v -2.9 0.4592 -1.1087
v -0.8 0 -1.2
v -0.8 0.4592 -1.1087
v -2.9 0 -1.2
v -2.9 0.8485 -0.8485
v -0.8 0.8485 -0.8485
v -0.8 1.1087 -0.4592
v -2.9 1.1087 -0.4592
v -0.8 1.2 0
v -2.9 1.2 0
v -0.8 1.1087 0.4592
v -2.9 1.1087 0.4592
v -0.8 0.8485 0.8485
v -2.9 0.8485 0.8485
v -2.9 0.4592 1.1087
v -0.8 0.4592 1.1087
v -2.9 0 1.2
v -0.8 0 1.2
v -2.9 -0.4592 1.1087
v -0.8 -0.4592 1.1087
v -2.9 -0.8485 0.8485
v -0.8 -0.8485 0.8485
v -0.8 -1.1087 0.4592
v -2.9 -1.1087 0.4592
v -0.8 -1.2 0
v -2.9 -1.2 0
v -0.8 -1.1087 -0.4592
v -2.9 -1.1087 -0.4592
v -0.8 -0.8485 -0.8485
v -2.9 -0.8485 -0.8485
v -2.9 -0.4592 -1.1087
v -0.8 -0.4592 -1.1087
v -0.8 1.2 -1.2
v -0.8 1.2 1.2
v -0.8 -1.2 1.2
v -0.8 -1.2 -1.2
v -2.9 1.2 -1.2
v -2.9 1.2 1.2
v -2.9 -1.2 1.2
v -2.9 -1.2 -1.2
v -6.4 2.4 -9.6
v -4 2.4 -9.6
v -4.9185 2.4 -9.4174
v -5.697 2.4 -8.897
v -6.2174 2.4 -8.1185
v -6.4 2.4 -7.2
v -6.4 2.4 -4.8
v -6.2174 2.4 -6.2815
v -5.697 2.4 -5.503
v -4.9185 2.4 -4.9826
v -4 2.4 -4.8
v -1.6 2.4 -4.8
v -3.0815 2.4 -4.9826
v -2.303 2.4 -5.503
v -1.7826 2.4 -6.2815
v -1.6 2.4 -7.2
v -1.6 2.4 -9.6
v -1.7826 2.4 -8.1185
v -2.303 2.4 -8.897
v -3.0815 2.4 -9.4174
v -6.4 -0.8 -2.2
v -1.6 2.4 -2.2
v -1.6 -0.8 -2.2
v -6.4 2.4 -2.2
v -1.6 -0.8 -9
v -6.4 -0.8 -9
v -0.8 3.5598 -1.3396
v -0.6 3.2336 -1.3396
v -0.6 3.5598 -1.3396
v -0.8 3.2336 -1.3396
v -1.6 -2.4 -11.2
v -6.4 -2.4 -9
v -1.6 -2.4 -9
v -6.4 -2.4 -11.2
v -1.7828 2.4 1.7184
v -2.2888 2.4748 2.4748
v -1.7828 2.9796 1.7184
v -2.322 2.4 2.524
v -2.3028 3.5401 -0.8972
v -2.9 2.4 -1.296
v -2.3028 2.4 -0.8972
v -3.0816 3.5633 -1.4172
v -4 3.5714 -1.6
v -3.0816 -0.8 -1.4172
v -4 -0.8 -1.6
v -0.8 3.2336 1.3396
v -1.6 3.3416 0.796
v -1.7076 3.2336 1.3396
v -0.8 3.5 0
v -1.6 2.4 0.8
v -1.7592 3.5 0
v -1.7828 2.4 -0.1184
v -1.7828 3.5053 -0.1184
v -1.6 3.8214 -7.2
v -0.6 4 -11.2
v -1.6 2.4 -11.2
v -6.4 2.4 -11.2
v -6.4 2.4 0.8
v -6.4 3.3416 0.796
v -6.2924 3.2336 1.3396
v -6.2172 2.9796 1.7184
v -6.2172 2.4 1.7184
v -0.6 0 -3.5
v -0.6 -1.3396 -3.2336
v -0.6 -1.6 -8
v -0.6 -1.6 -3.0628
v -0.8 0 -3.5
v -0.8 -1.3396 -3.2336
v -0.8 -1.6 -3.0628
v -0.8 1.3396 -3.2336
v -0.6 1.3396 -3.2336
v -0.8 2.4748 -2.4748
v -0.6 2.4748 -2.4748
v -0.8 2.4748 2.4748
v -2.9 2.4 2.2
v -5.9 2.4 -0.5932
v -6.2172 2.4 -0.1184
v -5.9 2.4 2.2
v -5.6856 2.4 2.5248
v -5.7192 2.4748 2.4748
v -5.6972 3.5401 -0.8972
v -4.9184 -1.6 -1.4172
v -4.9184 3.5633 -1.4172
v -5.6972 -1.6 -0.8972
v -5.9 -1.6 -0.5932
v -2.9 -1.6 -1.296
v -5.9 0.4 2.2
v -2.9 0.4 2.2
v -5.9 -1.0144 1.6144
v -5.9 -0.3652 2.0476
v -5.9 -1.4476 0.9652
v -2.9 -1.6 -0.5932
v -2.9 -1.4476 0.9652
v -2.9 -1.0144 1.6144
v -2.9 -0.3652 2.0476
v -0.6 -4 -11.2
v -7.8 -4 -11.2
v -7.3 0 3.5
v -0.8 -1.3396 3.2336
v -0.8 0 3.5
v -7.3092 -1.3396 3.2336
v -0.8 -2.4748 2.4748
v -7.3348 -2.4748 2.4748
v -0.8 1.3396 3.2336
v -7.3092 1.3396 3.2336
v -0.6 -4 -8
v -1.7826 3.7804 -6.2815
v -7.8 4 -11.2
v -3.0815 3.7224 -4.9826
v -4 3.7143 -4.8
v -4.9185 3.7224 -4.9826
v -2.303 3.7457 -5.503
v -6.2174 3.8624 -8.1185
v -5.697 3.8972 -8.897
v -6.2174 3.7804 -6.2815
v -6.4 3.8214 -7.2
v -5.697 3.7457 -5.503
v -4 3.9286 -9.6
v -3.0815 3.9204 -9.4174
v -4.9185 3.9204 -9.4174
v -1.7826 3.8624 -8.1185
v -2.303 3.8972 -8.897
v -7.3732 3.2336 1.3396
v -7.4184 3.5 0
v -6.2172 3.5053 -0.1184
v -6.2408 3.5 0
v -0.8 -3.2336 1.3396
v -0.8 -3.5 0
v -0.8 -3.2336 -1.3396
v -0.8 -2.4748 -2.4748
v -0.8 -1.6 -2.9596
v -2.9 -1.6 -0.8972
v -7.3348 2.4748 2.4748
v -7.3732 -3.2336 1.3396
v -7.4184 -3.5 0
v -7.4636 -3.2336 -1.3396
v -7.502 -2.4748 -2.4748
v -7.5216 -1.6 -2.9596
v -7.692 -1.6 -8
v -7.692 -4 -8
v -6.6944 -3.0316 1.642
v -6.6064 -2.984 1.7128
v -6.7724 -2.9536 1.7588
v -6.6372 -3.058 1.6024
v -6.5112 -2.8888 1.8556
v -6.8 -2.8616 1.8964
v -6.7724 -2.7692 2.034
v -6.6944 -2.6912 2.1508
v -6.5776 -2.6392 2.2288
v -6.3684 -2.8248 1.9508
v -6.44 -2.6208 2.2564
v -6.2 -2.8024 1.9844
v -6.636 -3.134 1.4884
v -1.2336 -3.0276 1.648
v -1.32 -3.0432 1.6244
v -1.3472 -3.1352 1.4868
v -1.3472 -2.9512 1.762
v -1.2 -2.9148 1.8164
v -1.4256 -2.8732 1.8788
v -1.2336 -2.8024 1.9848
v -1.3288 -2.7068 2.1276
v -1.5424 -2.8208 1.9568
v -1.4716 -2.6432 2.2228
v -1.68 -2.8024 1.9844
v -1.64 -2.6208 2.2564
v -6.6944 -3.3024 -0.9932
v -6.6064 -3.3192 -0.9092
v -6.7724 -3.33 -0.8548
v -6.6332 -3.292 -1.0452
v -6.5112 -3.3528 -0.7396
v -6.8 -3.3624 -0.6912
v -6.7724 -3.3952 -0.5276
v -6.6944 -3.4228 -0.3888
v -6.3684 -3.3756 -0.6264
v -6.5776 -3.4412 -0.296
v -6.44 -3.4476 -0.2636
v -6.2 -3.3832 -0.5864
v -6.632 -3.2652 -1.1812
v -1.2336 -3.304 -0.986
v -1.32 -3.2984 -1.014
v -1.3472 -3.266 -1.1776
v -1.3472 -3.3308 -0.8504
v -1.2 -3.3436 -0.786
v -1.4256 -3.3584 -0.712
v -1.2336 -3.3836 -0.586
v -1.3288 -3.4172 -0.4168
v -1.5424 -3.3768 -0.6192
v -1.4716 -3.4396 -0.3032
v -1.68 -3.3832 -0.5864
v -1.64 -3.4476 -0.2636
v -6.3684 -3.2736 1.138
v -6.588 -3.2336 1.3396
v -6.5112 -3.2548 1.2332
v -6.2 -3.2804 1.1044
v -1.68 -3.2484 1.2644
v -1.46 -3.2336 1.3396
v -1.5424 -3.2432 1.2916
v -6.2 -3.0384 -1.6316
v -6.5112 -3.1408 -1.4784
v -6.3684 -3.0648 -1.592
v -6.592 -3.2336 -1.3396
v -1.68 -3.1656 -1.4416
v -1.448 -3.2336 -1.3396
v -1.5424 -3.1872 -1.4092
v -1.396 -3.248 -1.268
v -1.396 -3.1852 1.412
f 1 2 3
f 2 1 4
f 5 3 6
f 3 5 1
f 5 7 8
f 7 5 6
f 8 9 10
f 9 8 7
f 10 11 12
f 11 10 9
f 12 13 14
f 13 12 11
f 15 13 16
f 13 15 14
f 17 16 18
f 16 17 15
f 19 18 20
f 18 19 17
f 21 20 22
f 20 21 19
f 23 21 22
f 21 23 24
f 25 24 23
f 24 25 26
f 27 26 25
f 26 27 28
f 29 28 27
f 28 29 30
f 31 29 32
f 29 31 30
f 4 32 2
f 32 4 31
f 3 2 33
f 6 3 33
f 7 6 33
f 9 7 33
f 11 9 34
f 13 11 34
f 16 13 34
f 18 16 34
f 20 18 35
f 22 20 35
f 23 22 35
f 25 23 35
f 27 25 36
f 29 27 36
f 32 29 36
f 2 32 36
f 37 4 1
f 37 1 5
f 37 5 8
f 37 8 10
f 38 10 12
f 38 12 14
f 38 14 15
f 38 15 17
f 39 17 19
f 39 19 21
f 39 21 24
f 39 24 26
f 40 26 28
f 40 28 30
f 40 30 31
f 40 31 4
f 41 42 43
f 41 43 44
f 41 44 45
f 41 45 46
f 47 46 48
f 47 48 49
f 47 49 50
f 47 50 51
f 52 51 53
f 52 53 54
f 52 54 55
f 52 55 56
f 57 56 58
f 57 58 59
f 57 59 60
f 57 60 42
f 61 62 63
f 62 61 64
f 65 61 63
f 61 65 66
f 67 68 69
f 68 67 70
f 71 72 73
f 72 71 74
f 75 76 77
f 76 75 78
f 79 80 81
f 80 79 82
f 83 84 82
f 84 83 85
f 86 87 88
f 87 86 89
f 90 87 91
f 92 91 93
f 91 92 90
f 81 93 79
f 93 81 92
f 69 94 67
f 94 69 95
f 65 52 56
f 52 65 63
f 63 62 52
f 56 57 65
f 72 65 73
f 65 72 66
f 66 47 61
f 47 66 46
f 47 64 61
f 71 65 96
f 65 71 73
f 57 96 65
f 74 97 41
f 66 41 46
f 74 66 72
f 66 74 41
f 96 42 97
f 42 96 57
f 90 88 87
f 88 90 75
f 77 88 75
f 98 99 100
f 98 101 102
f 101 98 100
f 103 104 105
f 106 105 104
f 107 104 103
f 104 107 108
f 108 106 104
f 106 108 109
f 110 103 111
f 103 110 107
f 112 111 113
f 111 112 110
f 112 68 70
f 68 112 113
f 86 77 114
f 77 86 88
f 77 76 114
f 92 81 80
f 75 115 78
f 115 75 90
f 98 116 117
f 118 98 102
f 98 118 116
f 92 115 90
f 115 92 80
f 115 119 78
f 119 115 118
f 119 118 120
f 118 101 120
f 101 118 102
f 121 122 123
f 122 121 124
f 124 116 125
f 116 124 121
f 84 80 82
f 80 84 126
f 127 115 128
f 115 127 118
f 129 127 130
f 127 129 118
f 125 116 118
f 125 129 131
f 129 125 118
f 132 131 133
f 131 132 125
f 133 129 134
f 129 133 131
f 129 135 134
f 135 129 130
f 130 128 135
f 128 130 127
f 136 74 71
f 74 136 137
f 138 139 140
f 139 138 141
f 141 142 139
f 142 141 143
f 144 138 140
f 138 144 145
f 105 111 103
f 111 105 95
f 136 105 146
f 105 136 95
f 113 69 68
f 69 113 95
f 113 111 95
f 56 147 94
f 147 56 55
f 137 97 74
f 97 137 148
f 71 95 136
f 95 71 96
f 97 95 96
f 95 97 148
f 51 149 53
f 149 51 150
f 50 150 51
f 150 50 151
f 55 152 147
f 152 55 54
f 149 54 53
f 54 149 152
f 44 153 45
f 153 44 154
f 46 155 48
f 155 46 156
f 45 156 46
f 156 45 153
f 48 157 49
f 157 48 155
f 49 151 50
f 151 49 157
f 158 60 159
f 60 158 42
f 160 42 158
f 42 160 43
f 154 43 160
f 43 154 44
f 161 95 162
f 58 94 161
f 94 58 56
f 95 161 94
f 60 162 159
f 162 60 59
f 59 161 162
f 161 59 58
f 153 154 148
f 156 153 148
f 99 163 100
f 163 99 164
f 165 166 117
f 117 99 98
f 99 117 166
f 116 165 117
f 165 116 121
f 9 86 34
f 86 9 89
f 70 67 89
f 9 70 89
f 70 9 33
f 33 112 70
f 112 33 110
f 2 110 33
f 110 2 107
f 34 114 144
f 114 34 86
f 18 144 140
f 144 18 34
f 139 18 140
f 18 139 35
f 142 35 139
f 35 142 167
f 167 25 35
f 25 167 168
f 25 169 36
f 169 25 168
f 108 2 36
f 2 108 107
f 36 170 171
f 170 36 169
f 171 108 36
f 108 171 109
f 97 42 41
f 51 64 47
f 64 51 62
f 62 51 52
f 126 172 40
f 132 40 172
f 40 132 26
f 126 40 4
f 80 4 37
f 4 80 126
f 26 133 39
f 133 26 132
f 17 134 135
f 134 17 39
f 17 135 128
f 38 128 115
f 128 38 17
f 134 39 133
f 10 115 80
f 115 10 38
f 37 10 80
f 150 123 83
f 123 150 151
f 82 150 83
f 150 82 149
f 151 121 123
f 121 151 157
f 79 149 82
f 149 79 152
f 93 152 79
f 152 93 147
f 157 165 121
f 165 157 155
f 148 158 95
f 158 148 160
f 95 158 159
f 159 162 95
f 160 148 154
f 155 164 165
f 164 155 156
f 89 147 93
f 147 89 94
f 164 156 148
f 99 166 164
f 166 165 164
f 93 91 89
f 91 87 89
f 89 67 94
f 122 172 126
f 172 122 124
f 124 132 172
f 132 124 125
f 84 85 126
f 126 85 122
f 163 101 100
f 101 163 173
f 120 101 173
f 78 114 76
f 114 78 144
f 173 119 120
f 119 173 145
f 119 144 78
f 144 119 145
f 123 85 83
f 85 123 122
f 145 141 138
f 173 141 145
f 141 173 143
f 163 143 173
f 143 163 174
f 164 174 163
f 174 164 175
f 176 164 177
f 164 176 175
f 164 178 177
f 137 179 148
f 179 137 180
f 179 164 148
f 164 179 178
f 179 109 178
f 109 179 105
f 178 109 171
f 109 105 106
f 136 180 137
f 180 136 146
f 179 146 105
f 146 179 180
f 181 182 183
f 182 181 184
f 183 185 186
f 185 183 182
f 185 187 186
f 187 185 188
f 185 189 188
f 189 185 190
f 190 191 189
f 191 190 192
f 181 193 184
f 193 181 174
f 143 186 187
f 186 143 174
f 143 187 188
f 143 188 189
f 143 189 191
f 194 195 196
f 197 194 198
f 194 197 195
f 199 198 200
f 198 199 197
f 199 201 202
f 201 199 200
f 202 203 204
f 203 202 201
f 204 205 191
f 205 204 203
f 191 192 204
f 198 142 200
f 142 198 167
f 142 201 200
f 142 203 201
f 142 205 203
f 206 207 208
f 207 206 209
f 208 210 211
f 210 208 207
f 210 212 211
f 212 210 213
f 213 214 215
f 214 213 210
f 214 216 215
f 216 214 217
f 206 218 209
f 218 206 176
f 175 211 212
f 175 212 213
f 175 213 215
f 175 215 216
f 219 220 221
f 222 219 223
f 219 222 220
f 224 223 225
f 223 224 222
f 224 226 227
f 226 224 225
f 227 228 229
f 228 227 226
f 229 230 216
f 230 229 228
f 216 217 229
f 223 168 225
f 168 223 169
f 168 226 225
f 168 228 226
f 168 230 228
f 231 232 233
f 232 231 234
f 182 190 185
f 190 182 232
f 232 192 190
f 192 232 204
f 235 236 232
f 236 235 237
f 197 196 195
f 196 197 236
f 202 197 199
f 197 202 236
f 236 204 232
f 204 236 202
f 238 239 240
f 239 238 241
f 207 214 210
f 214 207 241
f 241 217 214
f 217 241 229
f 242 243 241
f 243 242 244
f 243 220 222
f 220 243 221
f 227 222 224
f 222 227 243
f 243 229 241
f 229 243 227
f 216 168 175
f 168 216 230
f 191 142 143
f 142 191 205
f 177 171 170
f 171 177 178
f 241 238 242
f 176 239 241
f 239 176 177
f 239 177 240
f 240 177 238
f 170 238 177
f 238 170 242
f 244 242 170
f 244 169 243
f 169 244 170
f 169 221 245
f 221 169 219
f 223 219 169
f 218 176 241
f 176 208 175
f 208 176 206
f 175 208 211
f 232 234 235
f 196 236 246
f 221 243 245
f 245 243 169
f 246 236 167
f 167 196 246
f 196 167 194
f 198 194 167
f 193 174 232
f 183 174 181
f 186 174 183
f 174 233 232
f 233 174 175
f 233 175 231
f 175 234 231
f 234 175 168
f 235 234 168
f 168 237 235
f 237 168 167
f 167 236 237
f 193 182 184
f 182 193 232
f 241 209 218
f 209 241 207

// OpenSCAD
use <../lib.scad>
use <s/3817bs01.scad>
function ldraw_lib__3816bp6f() = [
// 0 ~Minifig Leg Right with Astro Pattern (Obsolete)
// 0 Name: 3816bp6f.dat
// 0 Author: Philippe Hurbain [Philo]
// 0 !LDRAW_ORG Part UPDATE 2023-03
// 0 !LICENSE Licensed under CC BY 4.0 : see CAreadme.txt
// 
// 0 BFC CERTIFY CCW
  [0,"BFC","CERTIFY"],
  [0,"BFC","CCW"],
// 
// 0 !CATEGORY Obsolete
// 0 !KEYWORDS Astrobots, Biff Starling, Bricklink 970c00pb0027
// 0 !KEYWORDS Mars Exploration Rover, promotional, Sandy Moondust, set 3928
// 0 !KEYWORDS set 3929
// 
// 0 !HISTORY 2020-06-02 [Philo] Adapted to corrected geometry
// 0 !HISTORY 2020-06-02 [pneaster] Original pattern design
// 0 !HISTORY 2020-12-29 [PTadmin] Official Update 2020-03
// 0 !HISTORY 2023-05-03 [Holly-Wood] Obsoleted due to bad geometry
// 0 !HISTORY 2023-06-24 [OrionP] Official Update 2023-03
// 
// 
// 1 16 0 0 0 -1 0 0 0 1 0 0 0 1 s\3817bs01.dat
  [1,16,0,0,0,-1,0,0,0,1,0,0,0,1, ldraw_lib__s__3817bs01()],
// 0 // Flat Front
// 4 16 -18.804 7.399 -4 -19.23 20 -4 -1.5 20 -4 -2 7.657 -4
  [4,16,-18.804,7.399,-4,-19.23,20,-4,-1.5,20,-4,-2,7.657,-4],
// 3 16 -18.804 7.399 -4 -2 7.657 -4 -2 7.399 -4
  [3,16,-18.804,7.399,-4,-2,7.657,-4,-2,7.399,-4],
// 3 16 -2 7.657 -4 -1.5 20 -4 -1.5 7.657 -4
  [3,16,-2,7.657,-4,-1.5,20,-4,-1.5,7.657,-4],
// 0 // Foot Front
// 4 16 -1.5 28 -10 -1.5 20 -10 -19.23 20 -10 -19.5 28 -10
  [4,16,-1.5,28,-10,-1.5,20,-10,-19.23,20,-10,-19.5,28,-10],
// 0 // Foot Top
// 4 16 -19.23 20 -4 -19.23 20 -10 -1.5 20 -10 -1.5 20 -4
  [4,16,-19.23,20,-4,-19.23,20,-10,-1.5,20,-10,-1.5,20,-4],
// 0 // condlines
// 5 24 -2 3.349 -8.084 -18.659 3.349 -8.084 -2 0 -8.75 -2 6.187 -6.187
  [5,24,-2,3.349,-8.084,-18.659,3.349,-8.084,-2,0,-8.75,-2,6.187,-6.187],
// 5 24 -2 6.187 -6.187 -18.755 6.187 -6.187 -2 7.399 -4 -2 3.349 -8.084
  [5,24,-2,6.187,-6.187,-18.755,6.187,-6.187,-2,7.399,-4,-2,3.349,-8.084],
// 5 24 -2 0 -8.75 -18.546 0 -8.75 -2 3.349 -8.084 -2 -3.349 -8.084
  [5,24,-2,0,-8.75,-18.546,0,-8.75,-2,3.349,-8.084,-2,-3.349,-8.084],
// 5 24 -2 -3.349 -8.084 -18.433 -3.349 -8.084 -2 0 -8.75 -2 -6.187 -6.187
  [5,24,-2,-3.349,-8.084,-18.433,-3.349,-8.084,-2,0,-8.75,-2,-6.187,-6.187],
// 0 // Pattern
// 4 0 -16.736 -4.105 -7.579 -16.593 -4.006 -7.645 -16.516 -4.282 -7.46 -16.931 -4.397 -7.384
  [4,0,-16.736,-4.105,-7.579,-16.593,-4.006,-7.645,-16.516,-4.282,-7.46,-16.931,-4.397,-7.384],
// 4 0 -16.931 -4.397 -7.384 -16.516 -4.282 -7.46 -16.278 -4.639 -7.222 -17 -4.741 -7.154
  [4,0,-16.931,-4.397,-7.384,-16.516,-4.282,-7.46,-16.278,-4.639,-7.222,-17,-4.741,-7.154],
// 4 0 -16.931 -5.085 -6.923 -17 -4.741 -7.154 -16.278 -4.639 -7.222 -16.736 -5.377 -6.728
  [4,0,-16.931,-5.085,-6.923,-17,-4.741,-7.154,-16.278,-4.639,-7.222,-16.736,-5.377,-6.728],
// 4 0 -16.736 -5.377 -6.728 -16.278 -4.639 -7.222 -15.921 -4.877 -7.062 -16.444 -5.572 -6.598
  [4,0,-16.736,-5.377,-6.728,-16.278,-4.639,-7.222,-15.921,-4.877,-7.062,-16.444,-5.572,-6.598],
// 4 0 -16.1 -5.641 -6.552 -16.444 -5.572 -6.598 -15.921 -4.877 -7.062 -15.5 -4.961 -7.006
  [4,0,-16.1,-5.641,-6.552,-16.444,-5.572,-6.598,-15.921,-4.877,-7.062,-15.5,-4.961,-7.006],
// 4 16 -16.59 -3.721 -7.835 -16.593 -4.006 -7.645 -16.736 -4.105 -7.579 -18.433 -3.349 -8.084
  [4,16,-16.59,-3.721,-7.835,-16.593,-4.006,-7.645,-16.736,-4.105,-7.579,-18.433,-3.349,-8.084],
// 4 16 -17 -4.741 -7.154 -16.931 -5.085 -6.923 -18.337 -6.187 -6.187 -18.433 -3.349 -8.084
  [4,16,-17,-4.741,-7.154,-16.931,-5.085,-6.923,-18.337,-6.187,-6.187,-18.433,-3.349,-8.084],
// 3 16 -18.337 -6.187 -6.187 -16.931 -5.085 -6.923 -16.736 -5.377 -6.728
  [3,16,-18.337,-6.187,-6.187,-16.931,-5.085,-6.923,-16.736,-5.377,-6.728],
// 3 16 -18.337 -6.187 -6.187 -16.736 -5.377 -6.728 -16.444 -5.572 -6.598
  [3,16,-18.337,-6.187,-6.187,-16.736,-5.377,-6.728,-16.444,-5.572,-6.598],
// 3 16 -18.337 -6.187 -6.187 -16.444 -5.572 -6.598 -16.1 -5.641 -6.552
  [3,16,-18.337,-6.187,-6.187,-16.444,-5.572,-6.598,-16.1,-5.641,-6.552],
// 3 0 -3.084 -4.12 -7.569 -3.3 -4.061 -7.608 -3.368 -3.717 -7.838
  [3,0,-3.084,-4.12,-7.569,-3.3,-4.061,-7.608,-3.368,-3.717,-7.838],
// 4 0 -3.368 -4.405 -7.378 -3.3 -4.061 -7.608 -3.084 -4.12 -7.569 -3 -4.541 -7.287
  [4,0,-3.368,-4.405,-7.378,-3.3,-4.061,-7.608,-3.084,-4.12,-7.569,-3,-4.541,-7.287],
// 4 0 -3.564 -4.697 -7.183 -3.368 -4.405 -7.378 -3 -4.541 -7.287 -3.084 -4.962 -7.006
  [4,0,-3.564,-4.697,-7.183,-3.368,-4.405,-7.378,-3,-4.541,-7.287,-3.084,-4.962,-7.006],
// 4 0 -3.564 -4.697 -7.183 -3.084 -4.962 -7.006 -3.322 -5.319 -6.767 -3.856 -4.892 -7.052
  [4,0,-3.564,-4.697,-7.183,-3.084,-4.962,-7.006,-3.322,-5.319,-6.767,-3.856,-4.892,-7.052],
// 4 0 -3.856 -4.892 -7.052 -3.322 -5.319 -6.767 -3.679 -5.557 -6.608 -4.2 -4.961 -7.006
  [4,0,-3.856,-4.892,-7.052,-3.322,-5.319,-6.767,-3.679,-5.557,-6.608,-4.2,-4.961,-7.006],
// 4 0 -4.2 -4.961 -7.006 -3.679 -5.557 -6.608 -4.1 -5.641 -6.552 -16.1 -5.641 -6.552
  [4,0,-4.2,-4.961,-7.006,-3.679,-5.557,-6.608,-4.1,-5.641,-6.552,-16.1,-5.641,-6.552],
// 3 0 -16.1 -5.641 -6.552 -15.5 -4.961 -7.006 -4.2 -4.961 -7.006
  [3,0,-16.1,-5.641,-6.552,-15.5,-4.961,-7.006,-4.2,-4.961,-7.006],
// 4 16 -2 -6.187 -6.187 -3.084 -4.962 -7.006 -3 -4.541 -7.287 -2 -3.349 -8.084
  [4,16,-2,-6.187,-6.187,-3.084,-4.962,-7.006,-3,-4.541,-7.287,-2,-3.349,-8.084],
// 3 16 -2 -6.187 -6.187 -3.322 -5.319 -6.767 -3.084 -4.962 -7.006
  [3,16,-2,-6.187,-6.187,-3.322,-5.319,-6.767,-3.084,-4.962,-7.006],
// 3 16 -2 -6.187 -6.187 -3.679 -5.557 -6.608 -3.322 -5.319 -6.767
  [3,16,-2,-6.187,-6.187,-3.679,-5.557,-6.608,-3.322,-5.319,-6.767],
// 3 16 -2 -6.187 -6.187 -4.1 -5.641 -6.552 -3.679 -5.557 -6.608
  [3,16,-2,-6.187,-6.187,-4.1,-5.641,-6.552,-3.679,-5.557,-6.608],
// 4 0 -16.736 2.483 -8.256 -16.583 2.613 -8.23 -16.516 2.273 -8.298 -16.931 2.137 -8.325
  [4,0,-16.736,2.483,-8.256,-16.583,2.613,-8.23,-16.516,2.273,-8.298,-16.931,2.137,-8.325],
// 4 0 -16.931 2.137 -8.325 -16.516 2.273 -8.298 -16.278 1.849 -8.382 -17 1.728 -8.406
  [4,0,-16.931,2.137,-8.325,-16.516,2.273,-8.298,-16.278,1.849,-8.382,-17,1.728,-8.406],
// 4 0 -16.931 1.319 -8.488 -17 1.728 -8.406 -16.278 1.849 -8.382 -16.736 0.972 -8.557
  [4,0,-16.931,1.319,-8.488,-17,1.728,-8.406,-16.278,1.849,-8.382,-16.736,0.972,-8.557],
// 4 0 -16.736 0.972 -8.557 -16.278 1.849 -8.382 -15.921 1.566 -8.439 -16.444 0.74 -8.603
  [4,0,-16.736,0.972,-8.557,-16.278,1.849,-8.382,-15.921,1.566,-8.439,-16.444,0.74,-8.603],
// 4 0 -16.1 0.659 -8.619 -16.444 0.74 -8.603 -15.921 1.566 -8.439 -15.5 1.466 -8.458
  [4,0,-16.1,0.659,-8.619,-16.444,0.74,-8.603,-15.921,1.566,-8.439,-15.5,1.466,-8.458],
// 4 16 -16.58 2.953 -8.163 -16.583 2.613 -8.23 -16.736 2.483 -8.256 -18.659 3.349 -8.084
  [4,16,-16.58,2.953,-8.163,-16.583,2.613,-8.23,-16.736,2.483,-8.256,-18.659,3.349,-8.084],
// 3 16 -18.546 0 -8.75 -17 1.728 -8.406 -16.931 1.319 -8.488
  [3,16,-18.546,0,-8.75,-17,1.728,-8.406,-16.931,1.319,-8.488],
// 3 16 -18.546 0 -8.75 -16.931 1.319 -8.488 -16.736 0.972 -8.557
  [3,16,-18.546,0,-8.75,-16.931,1.319,-8.488,-16.736,0.972,-8.557],
// 3 16 -18.546 0 -8.75 -16.736 0.972 -8.557 -16.444 0.74 -8.603
  [3,16,-18.546,0,-8.75,-16.736,0.972,-8.557,-16.444,0.74,-8.603],
// 3 16 -18.546 0 -8.75 -16.444 0.74 -8.603 -16.1 0.659 -8.619
  [3,16,-18.546,0,-8.75,-16.444,0.74,-8.603,-16.1,0.659,-8.619],
// 3 0 -3.084 2.465 -8.26 -3.3 2.535 -8.246 -3.368 2.944 -8.165
  [3,0,-3.084,2.465,-8.26,-3.3,2.535,-8.246,-3.368,2.944,-8.165],
// 4 0 -3.368 2.126 -8.327 -3.3 2.535 -8.246 -3.084 2.465 -8.26 -3 1.965 -8.359
  [4,0,-3.368,2.126,-8.327,-3.3,2.535,-8.246,-3.084,2.465,-8.26,-3,1.965,-8.359],
// 4 0 -3.564 1.78 -8.396 -3.368 2.126 -8.327 -3 1.965 -8.359 -3.084 1.465 -8.459
  [4,0,-3.564,1.78,-8.396,-3.368,2.126,-8.327,-3,1.965,-8.359,-3.084,1.465,-8.459],
// 4 0 -3.564 1.78 -8.396 -3.084 1.465 -8.459 -3.322 1.042 -8.543 -3.856 1.548 -8.442
  [4,0,-3.564,1.78,-8.396,-3.084,1.465,-8.459,-3.322,1.042,-8.543,-3.856,1.548,-8.442],
// 4 0 -3.856 1.548 -8.442 -3.322 1.042 -8.543 -3.679 0.758 -8.599 -4.2 1.466 -8.458
  [4,0,-3.856,1.548,-8.442,-3.322,1.042,-8.543,-3.679,0.758,-8.599,-4.2,1.466,-8.458],
// 4 0 -4.2 1.466 -8.458 -3.679 0.758 -8.599 -4.1 0.659 -8.619 -16.1 0.659 -8.619
  [4,0,-4.2,1.466,-8.458,-3.679,0.758,-8.599,-4.1,0.659,-8.619,-16.1,0.659,-8.619],
// 3 0 -16.1 0.659 -8.619 -15.5 1.466 -8.458 -4.2 1.466 -8.458
  [3,0,-16.1,0.659,-8.619,-15.5,1.466,-8.458,-4.2,1.466,-8.458],
// 4 16 -2 0 -8.75 -3.084 1.465 -8.459 -3 1.965 -8.359 -2 3.349 -8.084
  [4,16,-2,0,-8.75,-3.084,1.465,-8.459,-3,1.965,-8.359,-2,3.349,-8.084],
// 3 16 -2 0 -8.75 -3.322 1.042 -8.543 -3.084 1.465 -8.459
  [3,16,-2,0,-8.75,-3.322,1.042,-8.543,-3.084,1.465,-8.459],
// 3 16 -2 0 -8.75 -3.679 0.758 -8.599 -3.322 1.042 -8.543
  [3,16,-2,0,-8.75,-3.679,0.758,-8.599,-3.322,1.042,-8.543],
// 3 16 -2 0 -8.75 -4.1 0.659 -8.619 -3.679 0.758 -8.599
  [3,16,-2,0,-8.75,-4.1,0.659,-8.619,-3.679,0.758,-8.599],
// 4 82 -15.921 -2.845 -8.184 -15.5 -2.761 -8.201 -16.47 -3.349 -8.084 -16.278 -3.083 -8.137
  [4,82,-15.921,-2.845,-8.184,-15.5,-2.761,-8.201,-16.47,-3.349,-8.084,-16.278,-3.083,-8.137],
// 4 82 -16.278 -4.639 -7.222 -16.516 -4.282 -7.46 -16.47 -3.349 -8.084 -15.921 -4.877 -7.062
  [4,82,-16.278,-4.639,-7.222,-16.516,-4.282,-7.46,-16.47,-3.349,-8.084,-15.921,-4.877,-7.062],
// 4 82 -15.5 -4.961 -7.006 -15.921 -4.877 -7.062 -16.47 -3.349 -8.084 -4.2 -4.961 -7.006
  [4,82,-15.5,-4.961,-7.006,-15.921,-4.877,-7.062,-16.47,-3.349,-8.084,-4.2,-4.961,-7.006],
// 4 82 -4.2 -3.161 -8.121 -3.856 -3.229 -8.108 -3.65 -3.349 -8.084 -16.47 -3.349 -8.084
  [4,82,-4.2,-3.161,-8.121,-3.856,-3.229,-8.108,-3.65,-3.349,-8.084,-16.47,-3.349,-8.084],
// 4 82 -3.65 -3.349 -8.084 -3.368 -3.717 -7.838 -3.3 -4.061 -7.608 -3.368 -4.405 -7.378
  [4,82,-3.65,-3.349,-8.084,-3.368,-3.717,-7.838,-3.3,-4.061,-7.608,-3.368,-4.405,-7.378],
// 4 82 -3.65 -3.349 -8.084 -3.368 -4.405 -7.378 -3.564 -4.697 -7.183 -3.856 -4.892 -7.052
  [4,82,-3.65,-3.349,-8.084,-3.368,-4.405,-7.378,-3.564,-4.697,-7.183,-3.856,-4.892,-7.052],
// 4 82 -3.65 -3.349 -8.084 -3.856 -4.892 -7.052 -4.2 -4.961 -7.006 -16.47 -3.349 -8.084
  [4,82,-3.65,-3.349,-8.084,-3.856,-4.892,-7.052,-4.2,-4.961,-7.006,-16.47,-3.349,-8.084],
// 4 82 -15.921 3.98 -7.662 -15.5 4.079 -7.596 -16.48 3.349 -8.084 -16.278 3.696 -7.852
  [4,82,-15.921,3.98,-7.662,-15.5,4.079,-7.596,-16.48,3.349,-8.084,-16.278,3.696,-7.852],
// 4 82 -16.278 1.849 -8.382 -16.516 2.273 -8.298 -16.48 3.349 -8.084 -15.921 1.566 -8.439
  [4,82,-16.278,1.849,-8.382,-16.516,2.273,-8.298,-16.48,3.349,-8.084,-15.921,1.566,-8.439],
// 4 82 -15.5 1.466 -8.458 -15.921 1.566 -8.439 -16.48 3.349 -8.084 -4.2 1.466 -8.458
  [4,82,-15.5,1.466,-8.458,-15.921,1.566,-8.439,-16.48,3.349,-8.084,-4.2,1.466,-8.458],
// 4 82 -4.2 3.604 -7.914 -3.856 3.523 -7.968 -3.62 3.349 -8.084 -16.48 3.349 -8.084
  [4,82,-4.2,3.604,-7.914,-3.856,3.523,-7.968,-3.62,3.349,-8.084,-16.48,3.349,-8.084],
// 4 82 -3.62 3.349 -8.084 -3.368 2.944 -8.165 -3.3 2.535 -8.246 -3.368 2.126 -8.327
  [4,82,-3.62,3.349,-8.084,-3.368,2.944,-8.165,-3.3,2.535,-8.246,-3.368,2.126,-8.327],
// 4 82 -3.62 3.349 -8.084 -3.368 2.126 -8.327 -3.564 1.78 -8.396 -3.856 1.548 -8.442
  [4,82,-3.62,3.349,-8.084,-3.368,2.126,-8.327,-3.564,1.78,-8.396,-3.856,1.548,-8.442],
// 4 82 -3.62 3.349 -8.084 -3.856 1.548 -8.442 -4.2 1.466 -8.458 -16.48 3.349 -8.084
  [4,82,-3.62,3.349,-8.084,-3.856,1.548,-8.442,-4.2,1.466,-8.458,-16.48,3.349,-8.084],
// 4 16 -18.546 0 -8.75 -16.1 0.659 -8.619 -4.1 0.659 -8.619 -2 0 -8.75
  [4,16,-18.546,0,-8.75,-16.1,0.659,-8.619,-4.1,0.659,-8.619,-2,0,-8.75],
// 4 16 -16.1 -5.641 -6.552 -4.1 -5.641 -6.552 -2 -6.187 -6.187 -18.337 -6.187 -6.187
  [4,16,-16.1,-5.641,-6.552,-4.1,-5.641,-6.552,-2,-6.187,-6.187,-18.337,-6.187,-6.187],
// 4 16 -2 6.187 -6.187 -18.755 6.187 -6.187 -18.804 7.399 -4 -2 7.399 -4
  [4,16,-2,6.187,-6.187,-18.755,6.187,-6.187,-18.804,7.399,-4,-2,7.399,-4],
// 3 82 -16.48 3.349 -8.084 -15.5 4.079 -7.596 -4.2 3.604 -7.914
  [3,82,-16.48,3.349,-8.084,-15.5,4.079,-7.596,-4.2,3.604,-7.914],
// 4 16 -16.48 3.349 -8.084 -18.659 3.349 -8.084 -18.755 6.187 -6.187 -16.278 3.696 -7.852
  [4,16,-16.48,3.349,-8.084,-18.659,3.349,-8.084,-18.755,6.187,-6.187,-16.278,3.696,-7.852],
// 3 16 -16.278 3.696 -7.852 -18.755 6.187 -6.187 -15.921 3.98 -7.662
  [3,16,-16.278,3.696,-7.852,-18.755,6.187,-6.187,-15.921,3.98,-7.662],
// 3 16 -15.921 3.98 -7.662 -18.755 6.187 -6.187 -15.5 4.079 -7.596
  [3,16,-15.921,3.98,-7.662,-18.755,6.187,-6.187,-15.5,4.079,-7.596],
// 4 16 -15.5 4.079 -7.596 -18.755 6.187 -6.187 -2 6.187 -6.187 -4.2 3.604 -7.914
  [4,16,-15.5,4.079,-7.596,-18.755,6.187,-6.187,-2,6.187,-6.187,-4.2,3.604,-7.914],
// 3 16 -3.856 3.523 -7.968 -4.2 3.604 -7.914 -2 6.187 -6.187
  [3,16,-3.856,3.523,-7.968,-4.2,3.604,-7.914,-2,6.187,-6.187],
// 4 16 -3.62 3.349 -8.084 -3.856 3.523 -7.968 -2 6.187 -6.187 -2 3.349 -8.084
  [4,16,-3.62,3.349,-8.084,-3.856,3.523,-7.968,-2,6.187,-6.187,-2,3.349,-8.084],
// 4 16 -2 3.349 -8.084 -3.084 2.465 -8.26 -3.368 2.944 -8.165 -3.49 3.17 -8.12
  [4,16,-2,3.349,-8.084,-3.084,2.465,-8.26,-3.368,2.944,-8.165,-3.49,3.17,-8.12],
// 3 16 -3 1.965 -8.359 -3.084 2.465 -8.26 -2 3.349 -8.084
  [3,16,-3,1.965,-8.359,-3.084,2.465,-8.26,-2,3.349,-8.084],
// 3 16 -16.58 2.953 -8.163 -18.659 3.349 -8.084 -16.48 3.349 -8.084
  [3,16,-16.58,2.953,-8.163,-18.659,3.349,-8.084,-16.48,3.349,-8.084],
// 4 16 -18.659 3.349 -8.084 -16.736 2.483 -8.256 -16.931 2.137 -8.325 -18.546 0 -8.75
  [4,16,-18.659,3.349,-8.084,-16.736,2.483,-8.256,-16.931,2.137,-8.325,-18.546,0,-8.75],
// 3 16 -18.546 0 -8.75 -16.931 2.137 -8.325 -17 1.728 -8.406
  [3,16,-18.546,0,-8.75,-16.931,2.137,-8.325,-17,1.728,-8.406],
// 3 82 -16.47 -3.349 -8.084 -15.5 -2.761 -8.201 -4.2 -3.161 -8.121
  [3,82,-16.47,-3.349,-8.084,-15.5,-2.761,-8.201,-4.2,-3.161,-8.121],
// 3 82 -3.368 -3.717 -7.838 -3.65 -3.349 -8.084 -3.49 -3.53 -7.963
  [3,82,-3.368,-3.717,-7.838,-3.65,-3.349,-8.084,-3.49,-3.53,-7.963],
// 3 82 -3.368 2.944 -8.165 -3.62 3.349 -8.084 -3.49 3.17 -8.12
  [3,82,-3.368,2.944,-8.165,-3.62,3.349,-8.084,-3.49,3.17,-8.12],
// 3 16 -3.49 3.17 -8.12 -3.62 3.349 -8.084 -2 3.349 -8.084
  [3,16,-3.49,3.17,-8.12,-3.62,3.349,-8.084,-2,3.349,-8.084],
// 3 16 -3.49 -3.53 -7.963 -3.65 -3.349 -8.084 -2 -3.349 -8.084
  [3,16,-3.49,-3.53,-7.963,-3.65,-3.349,-8.084,-2,-3.349,-8.084],
// 4 16 -3.368 -3.717 -7.838 -3.49 -3.53 -7.963 -2 -3.349 -8.084 -3.084 -4.12 -7.569
  [4,16,-3.368,-3.717,-7.838,-3.49,-3.53,-7.963,-2,-3.349,-8.084,-3.084,-4.12,-7.569],
// 3 16 -3 -4.541 -7.287 -3.084 -4.12 -7.569 -2 -3.349 -8.084
  [3,16,-3,-4.541,-7.287,-3.084,-4.12,-7.569,-2,-3.349,-8.084],
// 3 16 -16.59 -3.721 -7.835 -18.433 -3.349 -8.084 -16.47 -3.349 -8.084
  [3,16,-16.59,-3.721,-7.835,-18.433,-3.349,-8.084,-16.47,-3.349,-8.084],
// 3 16 -16.931 -4.397 -7.384 -18.433 -3.349 -8.084 -16.736 -4.105 -7.579
  [3,16,-16.931,-4.397,-7.384,-18.433,-3.349,-8.084,-16.736,-4.105,-7.579],
// 3 16 -17 -4.741 -7.154 -18.433 -3.349 -8.084 -16.931 -4.397 -7.384
  [3,16,-17,-4.741,-7.154,-18.433,-3.349,-8.084,-16.931,-4.397,-7.384],
// 4 16 -16.47 -3.349 -8.084 -18.433 -3.349 -8.084 -18.546 0 -8.75 -16.278 -3.083 -8.137
  [4,16,-16.47,-3.349,-8.084,-18.433,-3.349,-8.084,-18.546,0,-8.75,-16.278,-3.083,-8.137],
// 3 16 -16.278 -3.083 -8.137 -18.546 0 -8.75 -15.921 -2.845 -8.184
  [3,16,-16.278,-3.083,-8.137,-18.546,0,-8.75,-15.921,-2.845,-8.184],
// 4 16 -15.5 -2.761 -8.201 -15.921 -2.845 -8.184 -18.546 0 -8.75 -2 0 -8.75
  [4,16,-15.5,-2.761,-8.201,-15.921,-2.845,-8.184,-18.546,0,-8.75,-2,0,-8.75],
// 3 16 -4.2 -3.161 -8.121 -15.5 -2.761 -8.201 -2 0 -8.75
  [3,16,-4.2,-3.161,-8.121,-15.5,-2.761,-8.201,-2,0,-8.75],
// 4 16 -3.856 -3.229 -8.108 -4.2 -3.161 -8.121 -2 0 -8.75 -2 -3.349 -8.084
  [4,16,-3.856,-3.229,-8.108,-4.2,-3.161,-8.121,-2,0,-8.75,-2,-3.349,-8.084],
// 3 16 -2 -3.349 -8.084 -3.65 -3.349 -8.084 -3.856 -3.229 -8.108
  [3,16,-2,-3.349,-8.084,-3.65,-3.349,-8.084,-3.856,-3.229,-8.108],
// 4 82 -16.47 -3.349 -8.084 -16.516 -4.282 -7.46 -16.593 -4.006 -7.645 -16.59 -3.721 -7.835
  [4,82,-16.47,-3.349,-8.084,-16.516,-4.282,-7.46,-16.593,-4.006,-7.645,-16.59,-3.721,-7.835],
// 4 82 -16.48 3.349 -8.084 -16.516 2.273 -8.298 -16.583 2.613 -8.23 -16.58 2.953 -8.163
  [4,82,-16.48,3.349,-8.084,-16.516,2.273,-8.298,-16.583,2.613,-8.23,-16.58,2.953,-8.163],
];
module ldraw_lib__3816bp6f(step=0, col=false, unit=2/5, alt=false, line=0.2, solid=!$preview)
    makepoly(ldraw_lib__3816bp6f(), step=step, col=col, unit=unit, alt=alt, line=line, solid=solid);
ldraw_lib__3816bp6f(line=0.2);
